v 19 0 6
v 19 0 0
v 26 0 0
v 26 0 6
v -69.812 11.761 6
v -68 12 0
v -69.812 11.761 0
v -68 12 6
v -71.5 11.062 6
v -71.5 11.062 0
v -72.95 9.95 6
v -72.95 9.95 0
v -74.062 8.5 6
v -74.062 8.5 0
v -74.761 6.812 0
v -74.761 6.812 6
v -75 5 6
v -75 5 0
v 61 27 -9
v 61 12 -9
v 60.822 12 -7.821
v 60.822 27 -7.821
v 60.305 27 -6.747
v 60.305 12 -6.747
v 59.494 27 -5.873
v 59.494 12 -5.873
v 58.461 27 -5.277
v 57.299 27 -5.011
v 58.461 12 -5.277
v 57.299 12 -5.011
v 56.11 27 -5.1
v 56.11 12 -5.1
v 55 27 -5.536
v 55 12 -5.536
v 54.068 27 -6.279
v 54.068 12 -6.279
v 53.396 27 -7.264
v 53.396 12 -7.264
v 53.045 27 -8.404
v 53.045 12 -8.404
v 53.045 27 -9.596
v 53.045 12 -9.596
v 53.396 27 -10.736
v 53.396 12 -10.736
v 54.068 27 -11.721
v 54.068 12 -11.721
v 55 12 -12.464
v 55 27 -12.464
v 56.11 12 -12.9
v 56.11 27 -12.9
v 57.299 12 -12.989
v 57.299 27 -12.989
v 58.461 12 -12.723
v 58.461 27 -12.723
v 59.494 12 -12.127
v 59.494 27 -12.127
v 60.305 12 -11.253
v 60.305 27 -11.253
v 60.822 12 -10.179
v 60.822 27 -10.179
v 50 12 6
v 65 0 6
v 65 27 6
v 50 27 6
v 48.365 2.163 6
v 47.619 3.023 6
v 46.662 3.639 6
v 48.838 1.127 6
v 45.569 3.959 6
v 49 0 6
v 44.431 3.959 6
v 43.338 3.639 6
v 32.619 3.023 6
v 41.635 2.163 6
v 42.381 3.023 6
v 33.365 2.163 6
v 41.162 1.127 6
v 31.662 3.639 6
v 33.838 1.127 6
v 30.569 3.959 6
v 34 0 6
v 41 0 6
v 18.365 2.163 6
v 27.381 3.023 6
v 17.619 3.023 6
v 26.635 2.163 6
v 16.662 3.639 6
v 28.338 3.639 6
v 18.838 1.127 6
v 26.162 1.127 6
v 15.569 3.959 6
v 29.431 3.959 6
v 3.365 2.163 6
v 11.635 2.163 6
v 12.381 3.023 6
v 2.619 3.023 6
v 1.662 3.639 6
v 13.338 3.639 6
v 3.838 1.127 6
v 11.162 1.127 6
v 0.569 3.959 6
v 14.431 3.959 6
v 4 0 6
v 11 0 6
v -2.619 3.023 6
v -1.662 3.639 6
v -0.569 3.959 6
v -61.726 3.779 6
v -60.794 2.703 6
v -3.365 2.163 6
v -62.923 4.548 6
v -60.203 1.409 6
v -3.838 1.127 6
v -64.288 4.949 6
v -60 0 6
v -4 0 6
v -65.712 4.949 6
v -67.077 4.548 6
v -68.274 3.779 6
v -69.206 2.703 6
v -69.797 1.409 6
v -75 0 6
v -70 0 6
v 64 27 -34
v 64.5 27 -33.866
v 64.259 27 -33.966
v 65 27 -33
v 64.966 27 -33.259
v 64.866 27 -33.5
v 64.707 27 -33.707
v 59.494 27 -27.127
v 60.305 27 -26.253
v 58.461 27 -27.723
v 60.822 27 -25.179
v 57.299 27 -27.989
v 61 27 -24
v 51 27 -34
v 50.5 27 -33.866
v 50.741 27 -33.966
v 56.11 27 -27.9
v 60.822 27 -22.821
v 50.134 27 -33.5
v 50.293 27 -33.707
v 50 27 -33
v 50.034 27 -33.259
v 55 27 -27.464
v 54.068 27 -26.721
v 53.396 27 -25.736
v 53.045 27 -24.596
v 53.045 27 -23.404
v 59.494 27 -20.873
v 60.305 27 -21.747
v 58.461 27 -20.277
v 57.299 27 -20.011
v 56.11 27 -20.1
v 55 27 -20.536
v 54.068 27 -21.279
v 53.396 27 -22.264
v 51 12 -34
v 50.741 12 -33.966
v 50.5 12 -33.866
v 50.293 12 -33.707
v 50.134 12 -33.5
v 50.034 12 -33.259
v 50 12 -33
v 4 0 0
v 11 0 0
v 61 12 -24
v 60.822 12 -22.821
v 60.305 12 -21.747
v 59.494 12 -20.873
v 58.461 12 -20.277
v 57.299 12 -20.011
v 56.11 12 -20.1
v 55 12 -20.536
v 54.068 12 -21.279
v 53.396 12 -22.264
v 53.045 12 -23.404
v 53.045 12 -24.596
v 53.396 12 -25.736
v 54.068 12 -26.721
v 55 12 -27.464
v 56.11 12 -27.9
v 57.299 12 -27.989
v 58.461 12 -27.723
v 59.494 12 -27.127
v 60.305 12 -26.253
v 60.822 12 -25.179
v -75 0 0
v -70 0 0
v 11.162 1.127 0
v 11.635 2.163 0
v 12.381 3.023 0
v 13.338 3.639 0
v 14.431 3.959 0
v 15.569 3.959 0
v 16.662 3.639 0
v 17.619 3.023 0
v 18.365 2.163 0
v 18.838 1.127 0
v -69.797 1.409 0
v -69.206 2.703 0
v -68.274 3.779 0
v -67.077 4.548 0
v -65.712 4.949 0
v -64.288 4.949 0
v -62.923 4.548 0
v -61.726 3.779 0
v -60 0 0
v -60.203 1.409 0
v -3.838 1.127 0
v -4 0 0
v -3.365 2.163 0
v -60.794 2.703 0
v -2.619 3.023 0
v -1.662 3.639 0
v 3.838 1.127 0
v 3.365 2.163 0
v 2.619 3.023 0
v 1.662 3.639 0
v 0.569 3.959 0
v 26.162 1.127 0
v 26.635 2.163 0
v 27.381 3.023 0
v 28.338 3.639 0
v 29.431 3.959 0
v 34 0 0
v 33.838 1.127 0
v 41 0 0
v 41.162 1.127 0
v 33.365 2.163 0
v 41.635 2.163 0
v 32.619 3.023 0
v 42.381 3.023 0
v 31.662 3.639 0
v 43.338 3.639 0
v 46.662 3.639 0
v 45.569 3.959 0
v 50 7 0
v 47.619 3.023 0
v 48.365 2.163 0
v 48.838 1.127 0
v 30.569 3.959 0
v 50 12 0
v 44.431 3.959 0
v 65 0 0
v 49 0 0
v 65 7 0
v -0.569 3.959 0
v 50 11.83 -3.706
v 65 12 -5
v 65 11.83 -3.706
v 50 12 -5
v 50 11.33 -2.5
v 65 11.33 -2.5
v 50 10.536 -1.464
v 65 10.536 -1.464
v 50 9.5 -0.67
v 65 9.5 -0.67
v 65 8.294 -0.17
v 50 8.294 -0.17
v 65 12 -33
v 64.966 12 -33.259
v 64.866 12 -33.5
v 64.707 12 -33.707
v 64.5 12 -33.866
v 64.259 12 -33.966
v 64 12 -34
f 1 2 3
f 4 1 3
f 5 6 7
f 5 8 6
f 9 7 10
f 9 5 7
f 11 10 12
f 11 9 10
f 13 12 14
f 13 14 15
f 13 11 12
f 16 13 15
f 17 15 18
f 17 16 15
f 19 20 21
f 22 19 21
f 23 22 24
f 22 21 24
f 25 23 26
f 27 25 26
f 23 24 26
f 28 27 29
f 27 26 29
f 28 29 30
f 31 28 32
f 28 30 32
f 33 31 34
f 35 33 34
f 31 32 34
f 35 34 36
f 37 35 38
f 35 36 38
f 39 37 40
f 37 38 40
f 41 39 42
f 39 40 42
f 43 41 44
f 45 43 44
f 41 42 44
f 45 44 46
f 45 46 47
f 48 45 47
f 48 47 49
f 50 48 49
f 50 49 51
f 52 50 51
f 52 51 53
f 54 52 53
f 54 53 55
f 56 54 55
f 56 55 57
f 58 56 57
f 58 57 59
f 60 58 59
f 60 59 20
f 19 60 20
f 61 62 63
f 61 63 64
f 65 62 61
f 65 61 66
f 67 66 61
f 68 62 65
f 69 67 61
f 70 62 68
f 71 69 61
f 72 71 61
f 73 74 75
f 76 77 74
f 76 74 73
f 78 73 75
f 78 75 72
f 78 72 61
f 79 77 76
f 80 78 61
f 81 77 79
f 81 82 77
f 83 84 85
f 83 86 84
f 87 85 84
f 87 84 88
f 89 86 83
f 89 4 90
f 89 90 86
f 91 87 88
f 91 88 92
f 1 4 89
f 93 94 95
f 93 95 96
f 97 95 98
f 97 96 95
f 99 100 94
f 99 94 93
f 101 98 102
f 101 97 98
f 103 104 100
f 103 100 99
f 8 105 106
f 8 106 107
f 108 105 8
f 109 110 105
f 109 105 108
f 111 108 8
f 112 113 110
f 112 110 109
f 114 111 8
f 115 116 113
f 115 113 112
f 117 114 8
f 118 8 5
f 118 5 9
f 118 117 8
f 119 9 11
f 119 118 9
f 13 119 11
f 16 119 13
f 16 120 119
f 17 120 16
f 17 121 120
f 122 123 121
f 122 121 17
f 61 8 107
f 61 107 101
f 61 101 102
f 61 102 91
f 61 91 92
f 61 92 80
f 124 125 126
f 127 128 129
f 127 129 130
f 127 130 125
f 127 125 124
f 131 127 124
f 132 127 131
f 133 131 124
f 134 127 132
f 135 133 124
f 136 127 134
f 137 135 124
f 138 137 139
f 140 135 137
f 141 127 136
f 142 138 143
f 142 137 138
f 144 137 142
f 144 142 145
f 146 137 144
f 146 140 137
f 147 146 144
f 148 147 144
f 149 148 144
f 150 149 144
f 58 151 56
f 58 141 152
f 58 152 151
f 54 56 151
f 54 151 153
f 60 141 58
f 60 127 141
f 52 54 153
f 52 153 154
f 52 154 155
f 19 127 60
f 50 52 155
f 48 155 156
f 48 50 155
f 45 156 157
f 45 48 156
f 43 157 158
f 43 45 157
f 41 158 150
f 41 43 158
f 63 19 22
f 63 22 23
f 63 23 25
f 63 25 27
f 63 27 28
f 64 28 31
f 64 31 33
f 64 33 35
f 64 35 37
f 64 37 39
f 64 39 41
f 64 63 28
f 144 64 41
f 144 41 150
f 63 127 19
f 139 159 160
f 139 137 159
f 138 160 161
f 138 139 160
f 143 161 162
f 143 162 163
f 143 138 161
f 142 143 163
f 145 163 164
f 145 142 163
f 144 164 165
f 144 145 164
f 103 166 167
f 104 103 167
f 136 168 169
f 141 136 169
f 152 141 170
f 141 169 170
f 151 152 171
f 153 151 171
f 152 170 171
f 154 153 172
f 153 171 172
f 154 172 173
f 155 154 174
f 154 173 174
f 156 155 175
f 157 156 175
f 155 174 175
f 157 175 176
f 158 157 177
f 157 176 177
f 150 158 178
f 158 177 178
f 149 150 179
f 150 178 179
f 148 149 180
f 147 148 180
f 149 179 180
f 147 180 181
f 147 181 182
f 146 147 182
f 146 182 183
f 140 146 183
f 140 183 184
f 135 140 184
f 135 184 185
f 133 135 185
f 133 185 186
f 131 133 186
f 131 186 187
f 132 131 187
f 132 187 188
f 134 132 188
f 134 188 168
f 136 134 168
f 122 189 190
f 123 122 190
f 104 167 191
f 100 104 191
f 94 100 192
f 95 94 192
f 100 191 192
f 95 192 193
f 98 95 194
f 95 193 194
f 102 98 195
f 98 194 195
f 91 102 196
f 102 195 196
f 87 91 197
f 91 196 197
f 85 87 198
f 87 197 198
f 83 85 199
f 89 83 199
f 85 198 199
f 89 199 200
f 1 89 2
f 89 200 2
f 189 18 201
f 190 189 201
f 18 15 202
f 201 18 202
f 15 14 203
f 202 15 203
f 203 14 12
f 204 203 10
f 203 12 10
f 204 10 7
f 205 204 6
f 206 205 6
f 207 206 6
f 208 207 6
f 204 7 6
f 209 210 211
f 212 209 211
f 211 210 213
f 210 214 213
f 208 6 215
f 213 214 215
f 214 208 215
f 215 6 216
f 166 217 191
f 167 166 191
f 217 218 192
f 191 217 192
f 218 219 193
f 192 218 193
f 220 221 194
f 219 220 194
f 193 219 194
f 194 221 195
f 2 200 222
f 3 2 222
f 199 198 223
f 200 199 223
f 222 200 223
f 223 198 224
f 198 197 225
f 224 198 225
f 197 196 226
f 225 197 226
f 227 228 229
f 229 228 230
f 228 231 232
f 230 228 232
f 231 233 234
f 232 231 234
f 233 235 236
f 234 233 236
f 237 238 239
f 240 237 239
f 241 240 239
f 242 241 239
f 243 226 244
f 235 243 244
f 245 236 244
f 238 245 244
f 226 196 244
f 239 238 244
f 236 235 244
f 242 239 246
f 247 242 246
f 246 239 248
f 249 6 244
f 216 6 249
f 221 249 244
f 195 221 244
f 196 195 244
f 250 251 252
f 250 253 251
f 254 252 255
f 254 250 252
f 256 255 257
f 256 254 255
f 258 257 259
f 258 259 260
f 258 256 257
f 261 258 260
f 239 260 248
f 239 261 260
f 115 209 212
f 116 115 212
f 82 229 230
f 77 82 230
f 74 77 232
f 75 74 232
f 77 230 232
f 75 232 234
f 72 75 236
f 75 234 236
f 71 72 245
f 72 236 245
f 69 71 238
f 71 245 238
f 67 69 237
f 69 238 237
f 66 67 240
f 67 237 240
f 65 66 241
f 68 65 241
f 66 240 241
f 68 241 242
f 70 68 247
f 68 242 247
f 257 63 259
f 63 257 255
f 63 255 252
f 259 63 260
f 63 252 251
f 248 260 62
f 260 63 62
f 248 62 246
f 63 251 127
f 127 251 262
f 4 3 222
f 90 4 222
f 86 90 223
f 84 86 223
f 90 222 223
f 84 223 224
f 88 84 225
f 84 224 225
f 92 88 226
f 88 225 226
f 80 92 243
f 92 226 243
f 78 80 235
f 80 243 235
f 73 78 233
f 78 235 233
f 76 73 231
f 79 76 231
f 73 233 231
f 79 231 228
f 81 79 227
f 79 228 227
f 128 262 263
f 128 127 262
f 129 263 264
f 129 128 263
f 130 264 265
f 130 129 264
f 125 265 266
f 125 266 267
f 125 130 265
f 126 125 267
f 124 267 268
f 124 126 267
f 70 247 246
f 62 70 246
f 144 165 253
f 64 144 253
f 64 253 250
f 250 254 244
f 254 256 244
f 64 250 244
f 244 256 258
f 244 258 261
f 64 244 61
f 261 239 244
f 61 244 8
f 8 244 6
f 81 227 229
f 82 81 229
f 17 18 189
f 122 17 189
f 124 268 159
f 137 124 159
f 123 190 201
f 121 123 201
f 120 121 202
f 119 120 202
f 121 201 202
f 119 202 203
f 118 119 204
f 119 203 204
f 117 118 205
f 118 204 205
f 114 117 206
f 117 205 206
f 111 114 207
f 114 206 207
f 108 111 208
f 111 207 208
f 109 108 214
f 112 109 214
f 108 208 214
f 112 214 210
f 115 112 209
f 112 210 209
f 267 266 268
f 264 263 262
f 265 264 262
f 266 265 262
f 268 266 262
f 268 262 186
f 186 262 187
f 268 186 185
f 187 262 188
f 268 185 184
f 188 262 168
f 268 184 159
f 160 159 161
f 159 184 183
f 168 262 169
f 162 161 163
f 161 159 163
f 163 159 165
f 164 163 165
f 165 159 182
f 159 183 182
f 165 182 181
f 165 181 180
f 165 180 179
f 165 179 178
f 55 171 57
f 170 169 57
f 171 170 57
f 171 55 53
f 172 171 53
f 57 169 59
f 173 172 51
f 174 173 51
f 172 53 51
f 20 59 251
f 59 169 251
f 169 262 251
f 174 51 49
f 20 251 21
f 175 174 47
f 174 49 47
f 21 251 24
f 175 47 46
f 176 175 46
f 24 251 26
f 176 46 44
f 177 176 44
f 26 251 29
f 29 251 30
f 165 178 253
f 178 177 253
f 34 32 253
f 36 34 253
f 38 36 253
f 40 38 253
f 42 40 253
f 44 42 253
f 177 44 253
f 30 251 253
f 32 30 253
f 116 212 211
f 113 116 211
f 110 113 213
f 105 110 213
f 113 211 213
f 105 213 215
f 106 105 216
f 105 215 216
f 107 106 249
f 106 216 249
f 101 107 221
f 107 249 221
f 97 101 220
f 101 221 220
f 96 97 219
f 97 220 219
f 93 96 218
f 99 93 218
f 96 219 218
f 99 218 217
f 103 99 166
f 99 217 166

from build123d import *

# Parameters (mm, degrees)
F1_DEPTH = 6
F2_R     = 7
F3_W     = 15
F3_H     = 34
F3_H_2   = 6
F4_DEPTH = 15
F5_R     = 4
F6_DEPTH = 25
F7_R     = 4.99999
F8_R     = 1


# Not quite as in the source:
# - a fillet or chamfer is up to 0.001 mm smaller than in the source, because OpenCascade refuses the exact size


with BuildPart() as f1:
    # F0 (on Top) → F1 (new body)
    with BuildSketch(Plane.XY):
        with BuildLine():
            ThreePointArc((-70, 0), (-65, 5), (-60, 0))
            Line((-60, 0), (-4, 0))
            ThreePointArc((-4, 0), (0, 4), (4, 0))
            Line((4, 0), (11, 0))
            ThreePointArc((11, 0), (15, 4), (19, 0))
            Line((19, 0), (26, 0))
            ThreePointArc((26, 0), (30, 4), (34, 0))
            Line((34, 0), (41, 0))
            ThreePointArc((41, 0), (45, 4), (49, 0))
            Line((49, 0), (65, 0))
            Line((65, 0), (65, 12))
            Line((65, 12), (-75, 12))
            Line((-75, 12), (-75, 0))
            Line((-75, 0), (-70, 0))
        make_face()
    extrude(amount=F1_DEPTH)

    # F2
    f2_edges = [f1.edges().sort_by_distance(p)[0] for p in [
        (-75, 12, 3),
    ]]
    fillet(f2_edges, radius=F2_R)

    # F3 (on face) → F4 (join)
    with BuildSketch(Plane(origin=(0, 12, 0), x_dir=(-1, 0, 0), z_dir=(0, 1, 0))):
        with Locations((-57.5, -17)):
            Rectangle(F3_W, F3_H)
        with Locations((-57.5, 3)):
            Rectangle(F3_W, F3_H_2)
    extrude(amount=F4_DEPTH)

    # F5 (on face) → F6 (cut)
    with BuildSketch(Plane.XZ.offset(-12)):
        with Locations((57, -9)):
            Circle(F5_R)
        with Locations((57, -24)):
            Circle(F5_R)
    extrude(amount=-F6_DEPTH, mode=Mode.SUBTRACT)

    # F7 (radius 5 in the source; OpenCascade refuses exactly that, so slightly less here)
    f7_edges = [f1.edges().sort_by_distance(p)[0] for p in [
        (57.5, 12, 0),
    ]]
    fillet(f7_edges, radius=F7_R)

    # F8
    f8_edges = [f1.edges().sort_by_distance(p)[0] for p in [
        (65, 19.5, -34),
        (50, 19.5, -34),
    ]]
    fillet(f8_edges, radius=F8_R)


solid = f1.part
